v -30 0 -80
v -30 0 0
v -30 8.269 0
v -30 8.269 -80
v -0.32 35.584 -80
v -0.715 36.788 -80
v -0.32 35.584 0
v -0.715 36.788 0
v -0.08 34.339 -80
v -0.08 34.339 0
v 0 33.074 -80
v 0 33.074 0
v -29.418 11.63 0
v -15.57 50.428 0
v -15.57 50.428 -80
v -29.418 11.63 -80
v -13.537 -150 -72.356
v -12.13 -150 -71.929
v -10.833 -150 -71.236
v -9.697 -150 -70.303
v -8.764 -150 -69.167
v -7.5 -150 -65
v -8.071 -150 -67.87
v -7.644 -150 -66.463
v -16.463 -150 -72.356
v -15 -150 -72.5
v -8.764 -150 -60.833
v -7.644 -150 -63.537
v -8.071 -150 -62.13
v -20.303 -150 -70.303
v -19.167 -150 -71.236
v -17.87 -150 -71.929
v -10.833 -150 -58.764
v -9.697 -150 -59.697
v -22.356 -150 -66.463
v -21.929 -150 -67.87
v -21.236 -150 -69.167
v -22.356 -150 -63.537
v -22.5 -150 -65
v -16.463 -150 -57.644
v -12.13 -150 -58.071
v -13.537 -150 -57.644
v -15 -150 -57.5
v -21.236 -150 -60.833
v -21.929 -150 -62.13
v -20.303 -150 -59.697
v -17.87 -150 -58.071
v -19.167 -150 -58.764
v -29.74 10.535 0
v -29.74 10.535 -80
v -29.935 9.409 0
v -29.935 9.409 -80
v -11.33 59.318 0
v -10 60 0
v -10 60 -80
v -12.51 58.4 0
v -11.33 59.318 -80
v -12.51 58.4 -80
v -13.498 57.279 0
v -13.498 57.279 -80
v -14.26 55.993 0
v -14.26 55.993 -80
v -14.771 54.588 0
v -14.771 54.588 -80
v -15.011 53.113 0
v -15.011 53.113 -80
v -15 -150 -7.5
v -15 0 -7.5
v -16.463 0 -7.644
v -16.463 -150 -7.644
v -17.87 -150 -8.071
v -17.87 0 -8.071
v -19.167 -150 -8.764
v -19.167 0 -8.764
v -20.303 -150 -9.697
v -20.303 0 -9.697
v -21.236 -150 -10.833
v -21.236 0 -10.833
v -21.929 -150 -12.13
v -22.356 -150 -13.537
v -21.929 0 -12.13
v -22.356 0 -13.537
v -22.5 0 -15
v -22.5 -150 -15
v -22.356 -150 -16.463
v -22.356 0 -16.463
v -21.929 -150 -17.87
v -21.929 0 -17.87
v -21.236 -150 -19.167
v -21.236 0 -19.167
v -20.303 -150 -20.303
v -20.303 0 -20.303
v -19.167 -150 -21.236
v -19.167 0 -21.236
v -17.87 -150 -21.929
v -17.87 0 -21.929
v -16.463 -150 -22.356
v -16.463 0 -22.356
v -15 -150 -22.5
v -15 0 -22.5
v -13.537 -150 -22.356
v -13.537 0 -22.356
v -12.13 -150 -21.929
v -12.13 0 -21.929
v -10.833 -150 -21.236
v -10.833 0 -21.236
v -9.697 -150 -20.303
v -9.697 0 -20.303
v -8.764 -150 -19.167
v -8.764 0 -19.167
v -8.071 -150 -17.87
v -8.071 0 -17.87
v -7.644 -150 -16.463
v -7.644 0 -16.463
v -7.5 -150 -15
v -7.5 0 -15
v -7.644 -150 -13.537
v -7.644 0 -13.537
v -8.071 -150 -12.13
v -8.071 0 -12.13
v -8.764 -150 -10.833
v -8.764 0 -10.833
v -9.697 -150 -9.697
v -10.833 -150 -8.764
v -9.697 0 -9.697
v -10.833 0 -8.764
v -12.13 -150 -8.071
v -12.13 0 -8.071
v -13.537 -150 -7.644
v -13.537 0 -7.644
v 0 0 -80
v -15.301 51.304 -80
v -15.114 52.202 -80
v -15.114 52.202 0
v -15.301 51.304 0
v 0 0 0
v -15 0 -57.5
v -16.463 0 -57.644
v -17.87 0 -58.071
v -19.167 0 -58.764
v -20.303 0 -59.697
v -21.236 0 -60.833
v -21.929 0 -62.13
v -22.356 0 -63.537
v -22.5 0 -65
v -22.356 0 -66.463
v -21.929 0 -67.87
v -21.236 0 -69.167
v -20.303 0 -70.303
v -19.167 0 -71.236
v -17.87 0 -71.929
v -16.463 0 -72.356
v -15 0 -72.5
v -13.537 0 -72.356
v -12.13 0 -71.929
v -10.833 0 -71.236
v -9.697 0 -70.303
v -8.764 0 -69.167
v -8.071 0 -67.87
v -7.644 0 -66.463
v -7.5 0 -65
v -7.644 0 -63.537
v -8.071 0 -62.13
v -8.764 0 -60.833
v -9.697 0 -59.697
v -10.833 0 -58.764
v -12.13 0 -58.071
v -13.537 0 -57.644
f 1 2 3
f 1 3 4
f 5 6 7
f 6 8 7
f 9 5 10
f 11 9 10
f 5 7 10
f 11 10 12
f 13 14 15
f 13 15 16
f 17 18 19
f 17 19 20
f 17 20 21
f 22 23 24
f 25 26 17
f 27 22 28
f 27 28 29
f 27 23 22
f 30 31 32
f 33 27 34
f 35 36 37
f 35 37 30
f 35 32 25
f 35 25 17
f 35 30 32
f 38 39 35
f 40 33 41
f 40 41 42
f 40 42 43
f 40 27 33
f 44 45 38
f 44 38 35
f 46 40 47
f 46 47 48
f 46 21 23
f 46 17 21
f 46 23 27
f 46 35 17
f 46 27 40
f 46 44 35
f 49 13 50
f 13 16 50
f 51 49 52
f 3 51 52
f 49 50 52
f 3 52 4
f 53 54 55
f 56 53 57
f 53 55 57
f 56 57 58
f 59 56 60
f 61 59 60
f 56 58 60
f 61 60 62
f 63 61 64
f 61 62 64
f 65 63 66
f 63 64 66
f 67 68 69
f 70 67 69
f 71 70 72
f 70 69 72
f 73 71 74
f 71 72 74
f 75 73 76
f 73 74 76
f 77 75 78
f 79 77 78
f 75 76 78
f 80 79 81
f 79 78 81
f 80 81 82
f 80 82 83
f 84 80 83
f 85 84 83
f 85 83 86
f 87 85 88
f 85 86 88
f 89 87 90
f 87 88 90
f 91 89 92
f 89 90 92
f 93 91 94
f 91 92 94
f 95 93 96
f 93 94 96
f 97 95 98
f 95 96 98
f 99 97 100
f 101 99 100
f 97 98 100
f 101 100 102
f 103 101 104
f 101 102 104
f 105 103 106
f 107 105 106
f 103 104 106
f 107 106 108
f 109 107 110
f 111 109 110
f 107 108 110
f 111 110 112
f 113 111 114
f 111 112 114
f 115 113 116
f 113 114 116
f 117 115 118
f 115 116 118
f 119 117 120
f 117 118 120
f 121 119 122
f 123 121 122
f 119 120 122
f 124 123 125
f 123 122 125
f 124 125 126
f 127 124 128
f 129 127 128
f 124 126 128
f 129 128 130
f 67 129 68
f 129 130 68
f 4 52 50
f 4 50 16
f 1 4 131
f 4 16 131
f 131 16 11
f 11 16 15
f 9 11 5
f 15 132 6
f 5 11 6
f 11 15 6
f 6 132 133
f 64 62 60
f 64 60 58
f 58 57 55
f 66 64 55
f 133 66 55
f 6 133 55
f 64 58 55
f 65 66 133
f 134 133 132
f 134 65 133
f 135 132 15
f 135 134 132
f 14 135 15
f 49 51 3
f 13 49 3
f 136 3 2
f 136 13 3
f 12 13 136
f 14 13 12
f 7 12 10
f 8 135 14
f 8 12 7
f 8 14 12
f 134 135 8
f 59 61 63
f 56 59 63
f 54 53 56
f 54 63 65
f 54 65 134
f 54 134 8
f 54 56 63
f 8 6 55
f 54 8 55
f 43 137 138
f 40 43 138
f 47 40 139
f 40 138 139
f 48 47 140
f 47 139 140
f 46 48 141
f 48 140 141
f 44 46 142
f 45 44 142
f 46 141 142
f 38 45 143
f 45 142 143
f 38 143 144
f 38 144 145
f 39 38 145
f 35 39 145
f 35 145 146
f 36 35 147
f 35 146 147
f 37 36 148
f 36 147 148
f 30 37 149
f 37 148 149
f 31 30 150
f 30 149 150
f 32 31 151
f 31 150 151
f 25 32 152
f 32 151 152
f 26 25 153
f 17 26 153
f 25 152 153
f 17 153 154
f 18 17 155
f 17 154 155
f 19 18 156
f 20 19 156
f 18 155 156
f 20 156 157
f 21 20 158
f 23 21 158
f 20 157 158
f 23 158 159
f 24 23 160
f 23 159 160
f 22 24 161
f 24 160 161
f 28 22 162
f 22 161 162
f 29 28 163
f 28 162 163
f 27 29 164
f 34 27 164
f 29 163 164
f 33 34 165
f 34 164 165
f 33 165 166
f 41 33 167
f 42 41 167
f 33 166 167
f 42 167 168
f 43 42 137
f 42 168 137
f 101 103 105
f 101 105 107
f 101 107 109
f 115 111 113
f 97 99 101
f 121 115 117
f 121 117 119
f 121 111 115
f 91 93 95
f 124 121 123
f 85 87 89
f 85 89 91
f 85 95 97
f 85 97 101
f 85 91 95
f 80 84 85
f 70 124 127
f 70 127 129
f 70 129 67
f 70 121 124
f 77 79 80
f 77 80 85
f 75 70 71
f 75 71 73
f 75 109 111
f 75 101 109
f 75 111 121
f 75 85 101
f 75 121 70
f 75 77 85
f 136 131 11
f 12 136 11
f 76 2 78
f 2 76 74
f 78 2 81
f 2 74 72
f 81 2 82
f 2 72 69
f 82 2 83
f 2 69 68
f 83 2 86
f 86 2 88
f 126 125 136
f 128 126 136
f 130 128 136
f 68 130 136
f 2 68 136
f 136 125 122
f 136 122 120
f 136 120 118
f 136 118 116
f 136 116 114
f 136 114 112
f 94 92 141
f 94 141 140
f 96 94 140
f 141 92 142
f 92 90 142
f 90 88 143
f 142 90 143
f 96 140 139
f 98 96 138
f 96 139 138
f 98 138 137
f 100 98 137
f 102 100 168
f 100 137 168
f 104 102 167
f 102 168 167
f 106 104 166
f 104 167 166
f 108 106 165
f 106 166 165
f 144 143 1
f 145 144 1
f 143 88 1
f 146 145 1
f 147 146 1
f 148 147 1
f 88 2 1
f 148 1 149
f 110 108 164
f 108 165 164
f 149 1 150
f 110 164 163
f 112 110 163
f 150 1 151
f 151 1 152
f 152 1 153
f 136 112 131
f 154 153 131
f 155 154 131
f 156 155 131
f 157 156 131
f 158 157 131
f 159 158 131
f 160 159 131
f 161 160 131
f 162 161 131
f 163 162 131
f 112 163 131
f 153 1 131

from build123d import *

# Parameters (mm, degrees)
SKETCH1_W           = 30
SKETCH1_H           = 80
BOSS_EXTRUDE1_DEPTH = 10
BOSS_EXTRUDE2_DEPTH = 80
FILLET1_R           = 10
FILLET2_R           = 10
FILLET4_R           = 10
SKETCH3_R           = 7.5
BOSS_EXTRUDE3_DEPTH = 150


with BuildPart() as part:
    # Sketch1 → Boss-Extrude1 (new body)
    with BuildSketch(Plane(origin=(0, 0, 0), x_dir=(1, 0, 0), z_dir=(0, 1, 0))):
        with Locations((-15, 40)):
            Rectangle(SKETCH1_W, SKETCH1_H)
    extrude(amount=BOSS_EXTRUDE1_DEPTH)

    # Sketch2 → Boss-Extrude2 (add)
    with BuildSketch(Plane(origin=(0, 0, -80), x_dir=(-1, 0, 0), z_dir=(0, 0, -1))):
        with BuildLine():
            Line((0, 10), (0, 35))
            Line((0, 35), (10, 60))
            ThreePointArc((10, 60), (13.809664499, 56.817288145), (15.008386018, 52))
            Line((15.008386018, 52), (30, 10))
            Line((30, 10), (30, 0))
            Line((30, 0), (0, 0))
            Line((0, 0), (0, 10))
        make_face()
    extrude(amount=-BOSS_EXTRUDE2_DEPTH)

    # Fillet1
    fillet1_edges = [part.edges().sort_by_distance(p)[0] for p in [
        (0, 35, -40),
    ]]
    fillet(fillet1_edges, radius=FILLET1_R)

    # Fillet2
    fillet2_edges = [part.edges().sort_by_distance(p)[0] for p in [
        (-15.008386018, 52, -40),
    ]]
    fillet(fillet2_edges, radius=FILLET2_R)

    # Fillet4
    fillet4_edges = [part.edges().sort_by_distance(p)[0] for p in [
        (-30, 10, -40),
    ]]
    fillet(fillet4_edges, radius=FILLET4_R)

    # Sketch3 → Boss-Extrude3 (add)
    with BuildSketch(Plane.XZ):
        with Locations(Location((-15, -15, 0), (0, 0, 90))):
            Circle(SKETCH3_R)
        with Locations(Location((-15, -65, 0), (0, 0, 90))):
            Circle(SKETCH3_R)
    extrude(amount=BOSS_EXTRUDE3_DEPTH)


solid = part.part
